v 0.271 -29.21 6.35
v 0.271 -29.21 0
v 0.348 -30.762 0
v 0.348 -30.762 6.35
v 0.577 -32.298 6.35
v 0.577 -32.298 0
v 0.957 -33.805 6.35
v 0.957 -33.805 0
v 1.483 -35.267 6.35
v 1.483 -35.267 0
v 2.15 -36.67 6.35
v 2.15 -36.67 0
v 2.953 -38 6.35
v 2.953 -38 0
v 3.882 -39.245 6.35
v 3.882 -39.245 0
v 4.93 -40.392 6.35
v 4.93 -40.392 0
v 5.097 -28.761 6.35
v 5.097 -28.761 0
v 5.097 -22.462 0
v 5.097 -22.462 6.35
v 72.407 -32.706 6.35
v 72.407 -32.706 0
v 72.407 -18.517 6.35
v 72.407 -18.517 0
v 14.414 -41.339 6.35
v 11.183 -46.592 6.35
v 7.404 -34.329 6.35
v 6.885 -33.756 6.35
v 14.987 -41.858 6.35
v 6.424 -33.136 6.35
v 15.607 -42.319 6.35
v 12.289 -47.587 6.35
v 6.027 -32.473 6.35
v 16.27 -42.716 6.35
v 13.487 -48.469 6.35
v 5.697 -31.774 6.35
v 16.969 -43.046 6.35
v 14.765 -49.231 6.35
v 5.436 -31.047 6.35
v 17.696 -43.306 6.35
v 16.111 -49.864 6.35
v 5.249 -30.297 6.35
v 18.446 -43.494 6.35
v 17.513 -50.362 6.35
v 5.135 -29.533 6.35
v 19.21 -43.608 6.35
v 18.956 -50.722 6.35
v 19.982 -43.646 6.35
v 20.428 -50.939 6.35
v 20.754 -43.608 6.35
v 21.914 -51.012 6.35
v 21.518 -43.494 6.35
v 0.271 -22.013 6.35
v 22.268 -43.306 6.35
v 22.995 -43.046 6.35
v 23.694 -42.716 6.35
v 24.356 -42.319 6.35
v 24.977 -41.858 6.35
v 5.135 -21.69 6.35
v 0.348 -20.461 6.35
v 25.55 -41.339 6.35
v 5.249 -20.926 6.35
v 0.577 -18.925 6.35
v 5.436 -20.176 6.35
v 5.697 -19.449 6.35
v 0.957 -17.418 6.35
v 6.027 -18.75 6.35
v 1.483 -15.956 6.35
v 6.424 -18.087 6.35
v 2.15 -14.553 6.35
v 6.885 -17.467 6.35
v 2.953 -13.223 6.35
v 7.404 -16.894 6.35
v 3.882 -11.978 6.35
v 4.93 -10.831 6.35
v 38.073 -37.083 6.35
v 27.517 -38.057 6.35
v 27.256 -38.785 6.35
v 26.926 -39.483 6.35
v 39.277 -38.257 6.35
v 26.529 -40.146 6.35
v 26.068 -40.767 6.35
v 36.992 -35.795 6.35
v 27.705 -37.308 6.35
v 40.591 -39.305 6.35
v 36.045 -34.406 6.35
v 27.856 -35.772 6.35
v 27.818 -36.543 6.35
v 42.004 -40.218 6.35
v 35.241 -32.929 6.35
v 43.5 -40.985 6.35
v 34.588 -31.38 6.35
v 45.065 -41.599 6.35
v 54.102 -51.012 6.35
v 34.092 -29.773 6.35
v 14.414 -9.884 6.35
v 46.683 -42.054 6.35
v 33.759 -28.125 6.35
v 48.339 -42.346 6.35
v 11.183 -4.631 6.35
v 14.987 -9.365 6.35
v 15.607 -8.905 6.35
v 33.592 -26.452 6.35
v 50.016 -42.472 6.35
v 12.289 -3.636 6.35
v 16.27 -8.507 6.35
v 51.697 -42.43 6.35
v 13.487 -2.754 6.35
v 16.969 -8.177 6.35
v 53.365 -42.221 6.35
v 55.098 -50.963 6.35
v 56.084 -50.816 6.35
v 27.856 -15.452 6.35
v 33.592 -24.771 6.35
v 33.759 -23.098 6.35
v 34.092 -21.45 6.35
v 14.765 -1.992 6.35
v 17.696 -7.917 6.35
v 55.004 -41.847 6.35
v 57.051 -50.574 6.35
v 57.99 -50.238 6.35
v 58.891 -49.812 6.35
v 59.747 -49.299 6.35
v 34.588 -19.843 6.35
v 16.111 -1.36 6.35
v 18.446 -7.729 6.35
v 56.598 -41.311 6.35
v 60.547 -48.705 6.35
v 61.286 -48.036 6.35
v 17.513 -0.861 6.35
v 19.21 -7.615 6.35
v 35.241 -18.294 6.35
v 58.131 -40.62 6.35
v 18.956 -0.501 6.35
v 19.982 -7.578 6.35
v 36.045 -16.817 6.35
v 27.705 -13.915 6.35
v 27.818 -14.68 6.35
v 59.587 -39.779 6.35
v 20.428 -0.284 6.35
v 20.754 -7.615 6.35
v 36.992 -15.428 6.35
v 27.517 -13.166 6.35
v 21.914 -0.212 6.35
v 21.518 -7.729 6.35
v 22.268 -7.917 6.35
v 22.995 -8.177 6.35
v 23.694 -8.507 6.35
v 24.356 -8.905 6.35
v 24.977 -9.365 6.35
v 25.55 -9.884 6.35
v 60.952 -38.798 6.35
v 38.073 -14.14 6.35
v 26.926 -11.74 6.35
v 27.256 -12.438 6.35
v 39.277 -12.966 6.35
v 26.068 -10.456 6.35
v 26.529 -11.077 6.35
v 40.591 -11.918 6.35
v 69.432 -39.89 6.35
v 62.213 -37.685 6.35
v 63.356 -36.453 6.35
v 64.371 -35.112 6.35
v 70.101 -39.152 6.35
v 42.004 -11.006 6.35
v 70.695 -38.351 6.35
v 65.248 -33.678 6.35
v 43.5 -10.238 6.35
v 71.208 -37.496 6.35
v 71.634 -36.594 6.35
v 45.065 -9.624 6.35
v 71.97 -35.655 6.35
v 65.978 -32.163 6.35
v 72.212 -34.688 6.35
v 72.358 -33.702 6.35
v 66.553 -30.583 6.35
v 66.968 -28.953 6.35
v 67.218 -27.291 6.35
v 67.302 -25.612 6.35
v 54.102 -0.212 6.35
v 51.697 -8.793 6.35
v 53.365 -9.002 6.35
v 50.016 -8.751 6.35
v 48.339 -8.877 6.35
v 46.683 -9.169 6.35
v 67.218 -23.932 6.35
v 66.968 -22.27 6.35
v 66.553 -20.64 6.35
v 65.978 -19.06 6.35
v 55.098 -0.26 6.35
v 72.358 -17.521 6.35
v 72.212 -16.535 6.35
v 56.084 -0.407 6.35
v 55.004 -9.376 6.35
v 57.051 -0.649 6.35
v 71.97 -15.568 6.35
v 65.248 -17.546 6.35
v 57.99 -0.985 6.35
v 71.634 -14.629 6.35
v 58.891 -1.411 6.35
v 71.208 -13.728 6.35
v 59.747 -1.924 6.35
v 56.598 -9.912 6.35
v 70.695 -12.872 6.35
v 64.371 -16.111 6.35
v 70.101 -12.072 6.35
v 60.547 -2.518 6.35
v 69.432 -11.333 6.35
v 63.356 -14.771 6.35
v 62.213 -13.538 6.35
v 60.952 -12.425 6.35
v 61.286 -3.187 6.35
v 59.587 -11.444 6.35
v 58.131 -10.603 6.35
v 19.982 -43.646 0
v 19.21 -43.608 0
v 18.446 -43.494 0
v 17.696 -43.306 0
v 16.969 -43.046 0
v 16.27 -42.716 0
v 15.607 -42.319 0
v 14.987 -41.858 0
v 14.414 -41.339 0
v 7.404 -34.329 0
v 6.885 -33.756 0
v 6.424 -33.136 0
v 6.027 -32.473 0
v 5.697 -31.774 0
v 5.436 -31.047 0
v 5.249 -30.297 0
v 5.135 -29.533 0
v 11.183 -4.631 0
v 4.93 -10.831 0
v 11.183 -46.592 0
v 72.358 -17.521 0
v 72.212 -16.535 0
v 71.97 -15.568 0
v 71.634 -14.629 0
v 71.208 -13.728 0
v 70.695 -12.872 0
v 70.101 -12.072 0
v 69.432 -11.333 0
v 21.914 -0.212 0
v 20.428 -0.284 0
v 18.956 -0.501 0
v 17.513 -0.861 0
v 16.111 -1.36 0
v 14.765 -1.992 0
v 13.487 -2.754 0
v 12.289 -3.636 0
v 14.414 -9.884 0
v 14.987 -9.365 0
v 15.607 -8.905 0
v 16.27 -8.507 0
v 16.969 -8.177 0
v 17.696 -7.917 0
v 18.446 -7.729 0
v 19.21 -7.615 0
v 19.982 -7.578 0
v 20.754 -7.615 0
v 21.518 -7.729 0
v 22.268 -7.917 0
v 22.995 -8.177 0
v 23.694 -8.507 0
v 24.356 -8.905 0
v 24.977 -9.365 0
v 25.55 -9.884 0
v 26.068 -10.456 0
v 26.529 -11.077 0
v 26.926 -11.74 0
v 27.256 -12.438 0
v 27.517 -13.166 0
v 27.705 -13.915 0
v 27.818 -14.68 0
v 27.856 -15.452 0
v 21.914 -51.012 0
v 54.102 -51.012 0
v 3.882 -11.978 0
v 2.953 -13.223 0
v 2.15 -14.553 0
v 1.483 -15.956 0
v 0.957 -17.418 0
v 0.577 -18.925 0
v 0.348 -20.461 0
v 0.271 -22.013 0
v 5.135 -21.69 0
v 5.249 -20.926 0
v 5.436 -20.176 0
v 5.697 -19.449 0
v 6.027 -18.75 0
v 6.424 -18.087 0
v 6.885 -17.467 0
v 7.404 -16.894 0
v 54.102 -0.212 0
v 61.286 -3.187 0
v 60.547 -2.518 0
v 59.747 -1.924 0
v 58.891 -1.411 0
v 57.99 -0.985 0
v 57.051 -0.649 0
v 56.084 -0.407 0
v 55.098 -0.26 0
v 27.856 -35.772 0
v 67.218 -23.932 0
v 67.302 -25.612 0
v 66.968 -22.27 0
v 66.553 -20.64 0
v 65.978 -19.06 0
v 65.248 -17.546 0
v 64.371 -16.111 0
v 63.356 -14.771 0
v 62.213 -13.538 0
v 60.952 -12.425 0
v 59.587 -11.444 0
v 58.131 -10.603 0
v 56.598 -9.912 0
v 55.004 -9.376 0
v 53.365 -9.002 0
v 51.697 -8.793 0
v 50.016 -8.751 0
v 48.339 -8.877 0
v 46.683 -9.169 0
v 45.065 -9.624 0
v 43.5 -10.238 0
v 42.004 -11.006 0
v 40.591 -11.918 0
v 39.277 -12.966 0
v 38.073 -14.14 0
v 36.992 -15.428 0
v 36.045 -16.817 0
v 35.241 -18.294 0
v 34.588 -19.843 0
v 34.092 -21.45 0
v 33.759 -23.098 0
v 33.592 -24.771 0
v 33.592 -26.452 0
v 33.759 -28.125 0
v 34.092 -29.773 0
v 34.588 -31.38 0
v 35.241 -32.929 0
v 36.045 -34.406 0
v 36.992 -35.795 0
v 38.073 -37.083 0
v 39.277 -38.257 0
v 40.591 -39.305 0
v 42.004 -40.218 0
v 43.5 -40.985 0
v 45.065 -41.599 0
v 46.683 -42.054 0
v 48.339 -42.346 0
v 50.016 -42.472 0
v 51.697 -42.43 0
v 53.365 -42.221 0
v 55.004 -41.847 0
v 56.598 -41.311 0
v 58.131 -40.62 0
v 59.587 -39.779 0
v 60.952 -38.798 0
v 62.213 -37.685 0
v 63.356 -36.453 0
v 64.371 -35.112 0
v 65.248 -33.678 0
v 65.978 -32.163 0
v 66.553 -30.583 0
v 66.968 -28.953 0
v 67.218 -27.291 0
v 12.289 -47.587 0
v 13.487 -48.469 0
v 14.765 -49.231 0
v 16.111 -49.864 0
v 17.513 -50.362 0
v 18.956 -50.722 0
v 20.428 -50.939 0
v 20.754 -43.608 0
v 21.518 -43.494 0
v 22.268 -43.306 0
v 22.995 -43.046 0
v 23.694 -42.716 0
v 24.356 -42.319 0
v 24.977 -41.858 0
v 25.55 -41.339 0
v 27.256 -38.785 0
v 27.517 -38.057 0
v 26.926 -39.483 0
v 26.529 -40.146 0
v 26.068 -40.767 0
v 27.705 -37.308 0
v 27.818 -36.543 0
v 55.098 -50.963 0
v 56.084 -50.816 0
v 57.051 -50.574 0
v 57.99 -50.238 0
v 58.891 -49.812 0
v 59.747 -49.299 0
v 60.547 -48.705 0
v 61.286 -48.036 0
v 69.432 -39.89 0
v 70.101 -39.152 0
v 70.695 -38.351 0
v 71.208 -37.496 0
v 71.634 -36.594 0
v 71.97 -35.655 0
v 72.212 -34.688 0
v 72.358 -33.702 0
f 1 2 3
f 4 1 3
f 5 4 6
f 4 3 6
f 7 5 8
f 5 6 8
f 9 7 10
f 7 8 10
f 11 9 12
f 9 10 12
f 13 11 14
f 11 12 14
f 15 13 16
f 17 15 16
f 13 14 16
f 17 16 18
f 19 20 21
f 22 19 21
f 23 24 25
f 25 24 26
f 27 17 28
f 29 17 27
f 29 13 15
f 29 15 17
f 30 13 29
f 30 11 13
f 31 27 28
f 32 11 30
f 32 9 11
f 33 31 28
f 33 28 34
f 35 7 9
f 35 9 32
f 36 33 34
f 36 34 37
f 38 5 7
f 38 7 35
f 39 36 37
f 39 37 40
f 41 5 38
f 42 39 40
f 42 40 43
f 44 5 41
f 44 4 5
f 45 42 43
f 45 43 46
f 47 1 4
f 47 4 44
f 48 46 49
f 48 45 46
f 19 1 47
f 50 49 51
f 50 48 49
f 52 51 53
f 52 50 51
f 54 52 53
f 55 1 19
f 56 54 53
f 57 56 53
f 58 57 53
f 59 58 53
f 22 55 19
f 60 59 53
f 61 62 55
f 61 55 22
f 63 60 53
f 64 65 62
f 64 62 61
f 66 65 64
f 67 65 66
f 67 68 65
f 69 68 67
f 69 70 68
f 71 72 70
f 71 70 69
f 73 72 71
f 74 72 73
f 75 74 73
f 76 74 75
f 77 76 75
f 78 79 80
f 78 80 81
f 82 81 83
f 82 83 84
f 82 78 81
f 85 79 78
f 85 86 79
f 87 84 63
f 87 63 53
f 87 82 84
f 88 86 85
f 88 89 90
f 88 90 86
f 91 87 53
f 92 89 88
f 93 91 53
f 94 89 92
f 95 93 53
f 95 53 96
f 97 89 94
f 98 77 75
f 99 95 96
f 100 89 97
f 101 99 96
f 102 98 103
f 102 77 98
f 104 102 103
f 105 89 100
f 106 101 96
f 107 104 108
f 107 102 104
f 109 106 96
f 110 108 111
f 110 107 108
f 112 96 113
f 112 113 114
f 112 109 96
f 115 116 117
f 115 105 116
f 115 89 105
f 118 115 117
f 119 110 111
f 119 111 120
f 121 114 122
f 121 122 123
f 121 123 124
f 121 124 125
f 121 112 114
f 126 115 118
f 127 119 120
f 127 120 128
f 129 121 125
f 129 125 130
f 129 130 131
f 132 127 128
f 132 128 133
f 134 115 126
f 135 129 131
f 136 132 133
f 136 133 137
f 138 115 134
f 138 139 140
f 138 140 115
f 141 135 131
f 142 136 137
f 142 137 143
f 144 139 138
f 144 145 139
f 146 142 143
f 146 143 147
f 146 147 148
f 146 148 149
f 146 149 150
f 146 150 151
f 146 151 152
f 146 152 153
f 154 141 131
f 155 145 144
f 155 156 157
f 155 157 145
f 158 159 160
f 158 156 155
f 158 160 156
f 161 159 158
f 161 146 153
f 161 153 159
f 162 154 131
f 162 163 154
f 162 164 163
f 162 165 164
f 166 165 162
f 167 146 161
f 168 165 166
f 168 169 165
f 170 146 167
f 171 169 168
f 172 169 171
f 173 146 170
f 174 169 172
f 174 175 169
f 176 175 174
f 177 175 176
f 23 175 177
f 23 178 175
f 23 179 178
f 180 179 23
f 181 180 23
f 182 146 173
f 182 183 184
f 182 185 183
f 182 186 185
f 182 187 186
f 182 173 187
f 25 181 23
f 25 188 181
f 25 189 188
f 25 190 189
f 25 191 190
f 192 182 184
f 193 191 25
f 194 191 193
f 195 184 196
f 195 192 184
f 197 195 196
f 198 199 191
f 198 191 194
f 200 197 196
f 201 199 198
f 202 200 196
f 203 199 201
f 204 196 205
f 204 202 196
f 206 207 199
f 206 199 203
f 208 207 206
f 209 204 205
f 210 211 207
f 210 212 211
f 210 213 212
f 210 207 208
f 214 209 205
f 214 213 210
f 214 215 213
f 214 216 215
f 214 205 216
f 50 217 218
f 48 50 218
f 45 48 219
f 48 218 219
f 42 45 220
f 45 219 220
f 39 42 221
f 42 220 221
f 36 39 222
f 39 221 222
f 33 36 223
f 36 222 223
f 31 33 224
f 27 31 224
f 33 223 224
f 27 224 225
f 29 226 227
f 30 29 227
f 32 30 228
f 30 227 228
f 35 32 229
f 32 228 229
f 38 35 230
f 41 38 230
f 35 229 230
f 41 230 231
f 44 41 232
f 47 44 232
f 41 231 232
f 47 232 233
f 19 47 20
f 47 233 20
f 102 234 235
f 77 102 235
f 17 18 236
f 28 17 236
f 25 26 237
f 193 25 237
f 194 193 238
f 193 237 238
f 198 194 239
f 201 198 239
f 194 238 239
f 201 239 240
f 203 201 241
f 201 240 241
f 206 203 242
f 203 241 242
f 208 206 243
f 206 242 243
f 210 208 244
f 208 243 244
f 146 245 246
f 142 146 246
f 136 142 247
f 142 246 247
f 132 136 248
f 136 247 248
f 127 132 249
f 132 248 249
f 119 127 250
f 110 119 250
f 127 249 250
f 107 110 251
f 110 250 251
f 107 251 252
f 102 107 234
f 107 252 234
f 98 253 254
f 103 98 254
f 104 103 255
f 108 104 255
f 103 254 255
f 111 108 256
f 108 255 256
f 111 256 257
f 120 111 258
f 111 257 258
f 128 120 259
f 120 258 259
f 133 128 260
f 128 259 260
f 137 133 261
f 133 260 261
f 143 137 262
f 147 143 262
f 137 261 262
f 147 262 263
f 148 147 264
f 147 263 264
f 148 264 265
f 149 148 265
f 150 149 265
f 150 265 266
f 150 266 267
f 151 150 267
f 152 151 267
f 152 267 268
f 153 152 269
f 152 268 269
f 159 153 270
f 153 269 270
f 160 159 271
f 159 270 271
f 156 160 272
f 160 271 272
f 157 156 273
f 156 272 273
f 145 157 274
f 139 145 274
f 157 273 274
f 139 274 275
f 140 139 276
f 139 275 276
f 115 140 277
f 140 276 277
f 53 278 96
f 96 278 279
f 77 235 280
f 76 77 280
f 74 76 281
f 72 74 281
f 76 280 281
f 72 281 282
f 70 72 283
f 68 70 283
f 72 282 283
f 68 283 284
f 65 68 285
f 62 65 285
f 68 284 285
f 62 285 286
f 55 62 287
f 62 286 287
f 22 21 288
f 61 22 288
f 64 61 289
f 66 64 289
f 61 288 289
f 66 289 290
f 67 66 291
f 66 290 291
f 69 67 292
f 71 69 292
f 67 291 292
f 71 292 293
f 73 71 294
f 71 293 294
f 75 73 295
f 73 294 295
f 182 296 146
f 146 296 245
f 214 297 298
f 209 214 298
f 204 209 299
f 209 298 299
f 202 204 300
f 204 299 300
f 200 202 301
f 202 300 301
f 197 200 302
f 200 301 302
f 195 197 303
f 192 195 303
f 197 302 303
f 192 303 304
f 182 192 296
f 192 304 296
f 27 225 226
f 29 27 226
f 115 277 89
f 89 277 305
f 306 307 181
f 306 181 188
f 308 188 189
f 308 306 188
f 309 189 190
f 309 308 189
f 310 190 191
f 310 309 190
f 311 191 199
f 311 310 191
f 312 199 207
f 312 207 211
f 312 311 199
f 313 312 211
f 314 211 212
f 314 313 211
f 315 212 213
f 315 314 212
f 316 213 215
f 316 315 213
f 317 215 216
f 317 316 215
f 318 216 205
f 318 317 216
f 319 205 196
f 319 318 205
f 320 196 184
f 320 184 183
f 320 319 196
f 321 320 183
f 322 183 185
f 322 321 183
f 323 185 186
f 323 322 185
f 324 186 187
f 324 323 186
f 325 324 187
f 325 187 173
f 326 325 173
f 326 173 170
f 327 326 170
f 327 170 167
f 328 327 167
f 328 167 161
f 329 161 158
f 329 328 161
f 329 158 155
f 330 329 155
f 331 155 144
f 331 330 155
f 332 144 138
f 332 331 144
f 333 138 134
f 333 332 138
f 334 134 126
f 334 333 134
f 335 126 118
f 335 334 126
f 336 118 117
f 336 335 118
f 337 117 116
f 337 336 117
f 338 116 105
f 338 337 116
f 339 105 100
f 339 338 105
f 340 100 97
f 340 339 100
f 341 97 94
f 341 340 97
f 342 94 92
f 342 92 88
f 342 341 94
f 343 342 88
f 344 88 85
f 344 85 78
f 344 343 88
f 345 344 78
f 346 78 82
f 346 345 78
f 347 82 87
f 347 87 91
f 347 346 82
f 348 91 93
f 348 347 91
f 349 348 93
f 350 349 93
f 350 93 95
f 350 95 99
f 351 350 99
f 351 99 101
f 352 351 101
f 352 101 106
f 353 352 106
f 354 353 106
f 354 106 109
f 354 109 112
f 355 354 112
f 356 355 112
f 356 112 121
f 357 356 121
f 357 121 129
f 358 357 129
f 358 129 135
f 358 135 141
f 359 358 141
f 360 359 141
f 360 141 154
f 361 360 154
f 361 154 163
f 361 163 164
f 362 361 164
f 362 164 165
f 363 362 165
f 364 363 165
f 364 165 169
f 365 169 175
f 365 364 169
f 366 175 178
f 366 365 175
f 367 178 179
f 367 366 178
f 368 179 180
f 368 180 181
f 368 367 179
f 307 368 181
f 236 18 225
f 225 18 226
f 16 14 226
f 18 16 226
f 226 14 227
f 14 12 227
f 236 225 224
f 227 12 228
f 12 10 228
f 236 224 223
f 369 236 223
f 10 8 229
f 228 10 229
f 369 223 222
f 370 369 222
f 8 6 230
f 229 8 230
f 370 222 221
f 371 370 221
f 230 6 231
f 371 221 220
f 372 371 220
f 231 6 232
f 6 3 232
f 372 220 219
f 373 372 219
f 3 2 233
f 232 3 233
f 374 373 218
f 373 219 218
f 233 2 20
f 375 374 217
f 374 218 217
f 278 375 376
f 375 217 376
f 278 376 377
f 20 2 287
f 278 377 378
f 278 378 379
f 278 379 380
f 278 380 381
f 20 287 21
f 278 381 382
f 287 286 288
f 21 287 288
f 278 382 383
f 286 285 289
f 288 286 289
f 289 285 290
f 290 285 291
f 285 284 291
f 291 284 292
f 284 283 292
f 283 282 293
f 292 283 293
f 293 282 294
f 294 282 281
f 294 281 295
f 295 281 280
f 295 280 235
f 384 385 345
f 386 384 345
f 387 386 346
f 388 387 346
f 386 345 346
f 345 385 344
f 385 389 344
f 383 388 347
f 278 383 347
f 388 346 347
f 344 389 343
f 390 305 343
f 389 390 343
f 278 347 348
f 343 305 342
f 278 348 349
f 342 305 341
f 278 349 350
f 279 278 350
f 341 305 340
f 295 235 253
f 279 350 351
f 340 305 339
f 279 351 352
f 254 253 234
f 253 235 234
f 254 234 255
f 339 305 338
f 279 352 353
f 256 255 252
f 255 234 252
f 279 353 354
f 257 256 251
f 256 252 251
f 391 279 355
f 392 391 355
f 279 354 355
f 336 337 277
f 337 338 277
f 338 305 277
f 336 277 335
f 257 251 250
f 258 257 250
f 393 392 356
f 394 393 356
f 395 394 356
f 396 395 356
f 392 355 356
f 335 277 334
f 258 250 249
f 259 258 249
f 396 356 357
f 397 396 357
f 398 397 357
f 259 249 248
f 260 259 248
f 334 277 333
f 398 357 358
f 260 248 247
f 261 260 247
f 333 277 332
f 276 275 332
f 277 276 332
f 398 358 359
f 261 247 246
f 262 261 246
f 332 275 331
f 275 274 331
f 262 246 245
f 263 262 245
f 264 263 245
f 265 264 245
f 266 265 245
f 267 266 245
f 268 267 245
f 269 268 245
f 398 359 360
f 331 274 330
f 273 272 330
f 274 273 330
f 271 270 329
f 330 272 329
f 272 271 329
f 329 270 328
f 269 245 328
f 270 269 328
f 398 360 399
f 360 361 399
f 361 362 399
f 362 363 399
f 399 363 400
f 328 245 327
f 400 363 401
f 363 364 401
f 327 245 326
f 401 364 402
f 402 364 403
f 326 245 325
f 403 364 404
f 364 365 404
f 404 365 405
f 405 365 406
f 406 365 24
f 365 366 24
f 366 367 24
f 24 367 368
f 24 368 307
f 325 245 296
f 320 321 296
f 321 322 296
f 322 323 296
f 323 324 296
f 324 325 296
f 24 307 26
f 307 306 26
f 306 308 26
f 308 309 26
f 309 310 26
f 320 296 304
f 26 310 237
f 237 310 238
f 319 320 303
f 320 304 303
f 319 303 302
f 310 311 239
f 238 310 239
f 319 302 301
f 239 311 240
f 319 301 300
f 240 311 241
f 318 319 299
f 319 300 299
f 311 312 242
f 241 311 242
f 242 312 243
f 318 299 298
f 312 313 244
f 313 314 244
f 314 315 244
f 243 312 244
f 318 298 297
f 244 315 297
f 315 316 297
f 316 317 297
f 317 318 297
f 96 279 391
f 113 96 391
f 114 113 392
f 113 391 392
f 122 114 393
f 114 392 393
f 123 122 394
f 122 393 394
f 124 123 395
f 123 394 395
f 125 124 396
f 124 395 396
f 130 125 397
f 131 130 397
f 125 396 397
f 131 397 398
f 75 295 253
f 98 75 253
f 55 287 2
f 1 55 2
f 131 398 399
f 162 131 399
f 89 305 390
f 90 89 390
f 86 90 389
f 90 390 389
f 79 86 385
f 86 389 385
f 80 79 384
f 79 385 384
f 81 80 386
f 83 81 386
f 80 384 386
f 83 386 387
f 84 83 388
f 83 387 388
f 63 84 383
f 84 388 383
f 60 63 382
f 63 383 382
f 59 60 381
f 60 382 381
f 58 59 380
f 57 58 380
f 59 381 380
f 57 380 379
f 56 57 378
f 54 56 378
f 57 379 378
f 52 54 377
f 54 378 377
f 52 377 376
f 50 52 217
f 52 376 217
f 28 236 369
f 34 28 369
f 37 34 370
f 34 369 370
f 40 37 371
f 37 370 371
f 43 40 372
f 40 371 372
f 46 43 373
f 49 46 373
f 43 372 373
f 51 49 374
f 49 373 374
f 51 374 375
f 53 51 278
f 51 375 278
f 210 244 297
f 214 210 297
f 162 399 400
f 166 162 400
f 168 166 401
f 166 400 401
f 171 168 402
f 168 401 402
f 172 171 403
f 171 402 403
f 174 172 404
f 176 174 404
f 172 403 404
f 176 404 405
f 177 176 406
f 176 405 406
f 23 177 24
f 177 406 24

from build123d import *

# Parameters (mm, degrees)
F0_R     = 16.8656
F1_DEPTH = 6.35


with BuildPart() as f1:
    # F0 (on Top) → F1 (new body)
    with BuildSketch(Plane.XY):
        with BuildLine():
            ThreePointArc((69.431615, -39.890337), (71.634026, -36.594196), (72.40741, -32.706132))
            Line((72.40741, -32.706132), (72.40741, -18.516952))
            ThreePointArc((72.40741, -18.516952), (71.634026, -14.628888), (69.431615, -11.332747))
            Line((69.431615, -11.332747), (61.286205, -3.187337))
            ThreePointArc((61.286205, -3.187337), (57.990064, -0.984926), (54.102, -0.211542))
            Line((54.102, -0.211542), (21.914013, -0.211542))
            ThreePointArc((21.914013, -0.211542), (16.111142, -1.359548), (11.182513, -4.630613))
            Line((11.182513, -4.630613), (4.930193, -10.831261))
            ThreePointArc((4.930193, -10.831261), (1.482689, -15.956217), (0.27141, -22.012888))
            Line((0.27141, -22.012888), (0.27141, -29.210196))
            ThreePointArc((0.27141, -29.210196), (1.482689, -35.266867), (4.930193, -40.391823))
            Line((4.930193, -40.391823), (11.182513, -46.592471))
            ThreePointArc((11.182513, -46.592471), (16.111142, -49.863535), (21.914013, -51.011542))
            Line((21.914013, -51.011542), (54.102, -51.011542))
            ThreePointArc((54.102, -51.011542), (57.990064, -50.238158), (61.286205, -48.035747))
            Line((61.286205, -48.035747), (69.431615, -39.890337))
        make_face()
        with BuildLine():
            Line((27.85581, -15.451542), (27.85581, -35.771542))
            ThreePointArc((27.85581, -35.771542), (25.549569, -41.339301), (19.98181, -43.645542))
            ThreePointArc((19.98181, -43.645542), (16.96856, -43.046169), (14.414051, -41.339301))
            Line((14.414051, -41.339301), (7.403651, -34.328901))
            ThreePointArc((7.403651, -34.328901), (5.696782, -31.774391), (5.09741, -28.761142))
            Line((5.09741, -28.761142), (5.09741, -22.461942))
            ThreePointArc((5.09741, -22.461942), (5.696782, -19.448693), (7.403651, -16.894183))
            Line((7.403651, -16.894183), (14.414051, -9.883783))
            ThreePointArc((14.414051, -9.883783), (22.995059, -8.176915), (27.85581, -15.451542))
        make_face(mode=Mode.SUBTRACT)
        with Locations((50.43641, -25.611542)):
            Circle(F0_R, mode=Mode.SUBTRACT)
    extrude(amount=F1_DEPTH)


solid = f1.part
